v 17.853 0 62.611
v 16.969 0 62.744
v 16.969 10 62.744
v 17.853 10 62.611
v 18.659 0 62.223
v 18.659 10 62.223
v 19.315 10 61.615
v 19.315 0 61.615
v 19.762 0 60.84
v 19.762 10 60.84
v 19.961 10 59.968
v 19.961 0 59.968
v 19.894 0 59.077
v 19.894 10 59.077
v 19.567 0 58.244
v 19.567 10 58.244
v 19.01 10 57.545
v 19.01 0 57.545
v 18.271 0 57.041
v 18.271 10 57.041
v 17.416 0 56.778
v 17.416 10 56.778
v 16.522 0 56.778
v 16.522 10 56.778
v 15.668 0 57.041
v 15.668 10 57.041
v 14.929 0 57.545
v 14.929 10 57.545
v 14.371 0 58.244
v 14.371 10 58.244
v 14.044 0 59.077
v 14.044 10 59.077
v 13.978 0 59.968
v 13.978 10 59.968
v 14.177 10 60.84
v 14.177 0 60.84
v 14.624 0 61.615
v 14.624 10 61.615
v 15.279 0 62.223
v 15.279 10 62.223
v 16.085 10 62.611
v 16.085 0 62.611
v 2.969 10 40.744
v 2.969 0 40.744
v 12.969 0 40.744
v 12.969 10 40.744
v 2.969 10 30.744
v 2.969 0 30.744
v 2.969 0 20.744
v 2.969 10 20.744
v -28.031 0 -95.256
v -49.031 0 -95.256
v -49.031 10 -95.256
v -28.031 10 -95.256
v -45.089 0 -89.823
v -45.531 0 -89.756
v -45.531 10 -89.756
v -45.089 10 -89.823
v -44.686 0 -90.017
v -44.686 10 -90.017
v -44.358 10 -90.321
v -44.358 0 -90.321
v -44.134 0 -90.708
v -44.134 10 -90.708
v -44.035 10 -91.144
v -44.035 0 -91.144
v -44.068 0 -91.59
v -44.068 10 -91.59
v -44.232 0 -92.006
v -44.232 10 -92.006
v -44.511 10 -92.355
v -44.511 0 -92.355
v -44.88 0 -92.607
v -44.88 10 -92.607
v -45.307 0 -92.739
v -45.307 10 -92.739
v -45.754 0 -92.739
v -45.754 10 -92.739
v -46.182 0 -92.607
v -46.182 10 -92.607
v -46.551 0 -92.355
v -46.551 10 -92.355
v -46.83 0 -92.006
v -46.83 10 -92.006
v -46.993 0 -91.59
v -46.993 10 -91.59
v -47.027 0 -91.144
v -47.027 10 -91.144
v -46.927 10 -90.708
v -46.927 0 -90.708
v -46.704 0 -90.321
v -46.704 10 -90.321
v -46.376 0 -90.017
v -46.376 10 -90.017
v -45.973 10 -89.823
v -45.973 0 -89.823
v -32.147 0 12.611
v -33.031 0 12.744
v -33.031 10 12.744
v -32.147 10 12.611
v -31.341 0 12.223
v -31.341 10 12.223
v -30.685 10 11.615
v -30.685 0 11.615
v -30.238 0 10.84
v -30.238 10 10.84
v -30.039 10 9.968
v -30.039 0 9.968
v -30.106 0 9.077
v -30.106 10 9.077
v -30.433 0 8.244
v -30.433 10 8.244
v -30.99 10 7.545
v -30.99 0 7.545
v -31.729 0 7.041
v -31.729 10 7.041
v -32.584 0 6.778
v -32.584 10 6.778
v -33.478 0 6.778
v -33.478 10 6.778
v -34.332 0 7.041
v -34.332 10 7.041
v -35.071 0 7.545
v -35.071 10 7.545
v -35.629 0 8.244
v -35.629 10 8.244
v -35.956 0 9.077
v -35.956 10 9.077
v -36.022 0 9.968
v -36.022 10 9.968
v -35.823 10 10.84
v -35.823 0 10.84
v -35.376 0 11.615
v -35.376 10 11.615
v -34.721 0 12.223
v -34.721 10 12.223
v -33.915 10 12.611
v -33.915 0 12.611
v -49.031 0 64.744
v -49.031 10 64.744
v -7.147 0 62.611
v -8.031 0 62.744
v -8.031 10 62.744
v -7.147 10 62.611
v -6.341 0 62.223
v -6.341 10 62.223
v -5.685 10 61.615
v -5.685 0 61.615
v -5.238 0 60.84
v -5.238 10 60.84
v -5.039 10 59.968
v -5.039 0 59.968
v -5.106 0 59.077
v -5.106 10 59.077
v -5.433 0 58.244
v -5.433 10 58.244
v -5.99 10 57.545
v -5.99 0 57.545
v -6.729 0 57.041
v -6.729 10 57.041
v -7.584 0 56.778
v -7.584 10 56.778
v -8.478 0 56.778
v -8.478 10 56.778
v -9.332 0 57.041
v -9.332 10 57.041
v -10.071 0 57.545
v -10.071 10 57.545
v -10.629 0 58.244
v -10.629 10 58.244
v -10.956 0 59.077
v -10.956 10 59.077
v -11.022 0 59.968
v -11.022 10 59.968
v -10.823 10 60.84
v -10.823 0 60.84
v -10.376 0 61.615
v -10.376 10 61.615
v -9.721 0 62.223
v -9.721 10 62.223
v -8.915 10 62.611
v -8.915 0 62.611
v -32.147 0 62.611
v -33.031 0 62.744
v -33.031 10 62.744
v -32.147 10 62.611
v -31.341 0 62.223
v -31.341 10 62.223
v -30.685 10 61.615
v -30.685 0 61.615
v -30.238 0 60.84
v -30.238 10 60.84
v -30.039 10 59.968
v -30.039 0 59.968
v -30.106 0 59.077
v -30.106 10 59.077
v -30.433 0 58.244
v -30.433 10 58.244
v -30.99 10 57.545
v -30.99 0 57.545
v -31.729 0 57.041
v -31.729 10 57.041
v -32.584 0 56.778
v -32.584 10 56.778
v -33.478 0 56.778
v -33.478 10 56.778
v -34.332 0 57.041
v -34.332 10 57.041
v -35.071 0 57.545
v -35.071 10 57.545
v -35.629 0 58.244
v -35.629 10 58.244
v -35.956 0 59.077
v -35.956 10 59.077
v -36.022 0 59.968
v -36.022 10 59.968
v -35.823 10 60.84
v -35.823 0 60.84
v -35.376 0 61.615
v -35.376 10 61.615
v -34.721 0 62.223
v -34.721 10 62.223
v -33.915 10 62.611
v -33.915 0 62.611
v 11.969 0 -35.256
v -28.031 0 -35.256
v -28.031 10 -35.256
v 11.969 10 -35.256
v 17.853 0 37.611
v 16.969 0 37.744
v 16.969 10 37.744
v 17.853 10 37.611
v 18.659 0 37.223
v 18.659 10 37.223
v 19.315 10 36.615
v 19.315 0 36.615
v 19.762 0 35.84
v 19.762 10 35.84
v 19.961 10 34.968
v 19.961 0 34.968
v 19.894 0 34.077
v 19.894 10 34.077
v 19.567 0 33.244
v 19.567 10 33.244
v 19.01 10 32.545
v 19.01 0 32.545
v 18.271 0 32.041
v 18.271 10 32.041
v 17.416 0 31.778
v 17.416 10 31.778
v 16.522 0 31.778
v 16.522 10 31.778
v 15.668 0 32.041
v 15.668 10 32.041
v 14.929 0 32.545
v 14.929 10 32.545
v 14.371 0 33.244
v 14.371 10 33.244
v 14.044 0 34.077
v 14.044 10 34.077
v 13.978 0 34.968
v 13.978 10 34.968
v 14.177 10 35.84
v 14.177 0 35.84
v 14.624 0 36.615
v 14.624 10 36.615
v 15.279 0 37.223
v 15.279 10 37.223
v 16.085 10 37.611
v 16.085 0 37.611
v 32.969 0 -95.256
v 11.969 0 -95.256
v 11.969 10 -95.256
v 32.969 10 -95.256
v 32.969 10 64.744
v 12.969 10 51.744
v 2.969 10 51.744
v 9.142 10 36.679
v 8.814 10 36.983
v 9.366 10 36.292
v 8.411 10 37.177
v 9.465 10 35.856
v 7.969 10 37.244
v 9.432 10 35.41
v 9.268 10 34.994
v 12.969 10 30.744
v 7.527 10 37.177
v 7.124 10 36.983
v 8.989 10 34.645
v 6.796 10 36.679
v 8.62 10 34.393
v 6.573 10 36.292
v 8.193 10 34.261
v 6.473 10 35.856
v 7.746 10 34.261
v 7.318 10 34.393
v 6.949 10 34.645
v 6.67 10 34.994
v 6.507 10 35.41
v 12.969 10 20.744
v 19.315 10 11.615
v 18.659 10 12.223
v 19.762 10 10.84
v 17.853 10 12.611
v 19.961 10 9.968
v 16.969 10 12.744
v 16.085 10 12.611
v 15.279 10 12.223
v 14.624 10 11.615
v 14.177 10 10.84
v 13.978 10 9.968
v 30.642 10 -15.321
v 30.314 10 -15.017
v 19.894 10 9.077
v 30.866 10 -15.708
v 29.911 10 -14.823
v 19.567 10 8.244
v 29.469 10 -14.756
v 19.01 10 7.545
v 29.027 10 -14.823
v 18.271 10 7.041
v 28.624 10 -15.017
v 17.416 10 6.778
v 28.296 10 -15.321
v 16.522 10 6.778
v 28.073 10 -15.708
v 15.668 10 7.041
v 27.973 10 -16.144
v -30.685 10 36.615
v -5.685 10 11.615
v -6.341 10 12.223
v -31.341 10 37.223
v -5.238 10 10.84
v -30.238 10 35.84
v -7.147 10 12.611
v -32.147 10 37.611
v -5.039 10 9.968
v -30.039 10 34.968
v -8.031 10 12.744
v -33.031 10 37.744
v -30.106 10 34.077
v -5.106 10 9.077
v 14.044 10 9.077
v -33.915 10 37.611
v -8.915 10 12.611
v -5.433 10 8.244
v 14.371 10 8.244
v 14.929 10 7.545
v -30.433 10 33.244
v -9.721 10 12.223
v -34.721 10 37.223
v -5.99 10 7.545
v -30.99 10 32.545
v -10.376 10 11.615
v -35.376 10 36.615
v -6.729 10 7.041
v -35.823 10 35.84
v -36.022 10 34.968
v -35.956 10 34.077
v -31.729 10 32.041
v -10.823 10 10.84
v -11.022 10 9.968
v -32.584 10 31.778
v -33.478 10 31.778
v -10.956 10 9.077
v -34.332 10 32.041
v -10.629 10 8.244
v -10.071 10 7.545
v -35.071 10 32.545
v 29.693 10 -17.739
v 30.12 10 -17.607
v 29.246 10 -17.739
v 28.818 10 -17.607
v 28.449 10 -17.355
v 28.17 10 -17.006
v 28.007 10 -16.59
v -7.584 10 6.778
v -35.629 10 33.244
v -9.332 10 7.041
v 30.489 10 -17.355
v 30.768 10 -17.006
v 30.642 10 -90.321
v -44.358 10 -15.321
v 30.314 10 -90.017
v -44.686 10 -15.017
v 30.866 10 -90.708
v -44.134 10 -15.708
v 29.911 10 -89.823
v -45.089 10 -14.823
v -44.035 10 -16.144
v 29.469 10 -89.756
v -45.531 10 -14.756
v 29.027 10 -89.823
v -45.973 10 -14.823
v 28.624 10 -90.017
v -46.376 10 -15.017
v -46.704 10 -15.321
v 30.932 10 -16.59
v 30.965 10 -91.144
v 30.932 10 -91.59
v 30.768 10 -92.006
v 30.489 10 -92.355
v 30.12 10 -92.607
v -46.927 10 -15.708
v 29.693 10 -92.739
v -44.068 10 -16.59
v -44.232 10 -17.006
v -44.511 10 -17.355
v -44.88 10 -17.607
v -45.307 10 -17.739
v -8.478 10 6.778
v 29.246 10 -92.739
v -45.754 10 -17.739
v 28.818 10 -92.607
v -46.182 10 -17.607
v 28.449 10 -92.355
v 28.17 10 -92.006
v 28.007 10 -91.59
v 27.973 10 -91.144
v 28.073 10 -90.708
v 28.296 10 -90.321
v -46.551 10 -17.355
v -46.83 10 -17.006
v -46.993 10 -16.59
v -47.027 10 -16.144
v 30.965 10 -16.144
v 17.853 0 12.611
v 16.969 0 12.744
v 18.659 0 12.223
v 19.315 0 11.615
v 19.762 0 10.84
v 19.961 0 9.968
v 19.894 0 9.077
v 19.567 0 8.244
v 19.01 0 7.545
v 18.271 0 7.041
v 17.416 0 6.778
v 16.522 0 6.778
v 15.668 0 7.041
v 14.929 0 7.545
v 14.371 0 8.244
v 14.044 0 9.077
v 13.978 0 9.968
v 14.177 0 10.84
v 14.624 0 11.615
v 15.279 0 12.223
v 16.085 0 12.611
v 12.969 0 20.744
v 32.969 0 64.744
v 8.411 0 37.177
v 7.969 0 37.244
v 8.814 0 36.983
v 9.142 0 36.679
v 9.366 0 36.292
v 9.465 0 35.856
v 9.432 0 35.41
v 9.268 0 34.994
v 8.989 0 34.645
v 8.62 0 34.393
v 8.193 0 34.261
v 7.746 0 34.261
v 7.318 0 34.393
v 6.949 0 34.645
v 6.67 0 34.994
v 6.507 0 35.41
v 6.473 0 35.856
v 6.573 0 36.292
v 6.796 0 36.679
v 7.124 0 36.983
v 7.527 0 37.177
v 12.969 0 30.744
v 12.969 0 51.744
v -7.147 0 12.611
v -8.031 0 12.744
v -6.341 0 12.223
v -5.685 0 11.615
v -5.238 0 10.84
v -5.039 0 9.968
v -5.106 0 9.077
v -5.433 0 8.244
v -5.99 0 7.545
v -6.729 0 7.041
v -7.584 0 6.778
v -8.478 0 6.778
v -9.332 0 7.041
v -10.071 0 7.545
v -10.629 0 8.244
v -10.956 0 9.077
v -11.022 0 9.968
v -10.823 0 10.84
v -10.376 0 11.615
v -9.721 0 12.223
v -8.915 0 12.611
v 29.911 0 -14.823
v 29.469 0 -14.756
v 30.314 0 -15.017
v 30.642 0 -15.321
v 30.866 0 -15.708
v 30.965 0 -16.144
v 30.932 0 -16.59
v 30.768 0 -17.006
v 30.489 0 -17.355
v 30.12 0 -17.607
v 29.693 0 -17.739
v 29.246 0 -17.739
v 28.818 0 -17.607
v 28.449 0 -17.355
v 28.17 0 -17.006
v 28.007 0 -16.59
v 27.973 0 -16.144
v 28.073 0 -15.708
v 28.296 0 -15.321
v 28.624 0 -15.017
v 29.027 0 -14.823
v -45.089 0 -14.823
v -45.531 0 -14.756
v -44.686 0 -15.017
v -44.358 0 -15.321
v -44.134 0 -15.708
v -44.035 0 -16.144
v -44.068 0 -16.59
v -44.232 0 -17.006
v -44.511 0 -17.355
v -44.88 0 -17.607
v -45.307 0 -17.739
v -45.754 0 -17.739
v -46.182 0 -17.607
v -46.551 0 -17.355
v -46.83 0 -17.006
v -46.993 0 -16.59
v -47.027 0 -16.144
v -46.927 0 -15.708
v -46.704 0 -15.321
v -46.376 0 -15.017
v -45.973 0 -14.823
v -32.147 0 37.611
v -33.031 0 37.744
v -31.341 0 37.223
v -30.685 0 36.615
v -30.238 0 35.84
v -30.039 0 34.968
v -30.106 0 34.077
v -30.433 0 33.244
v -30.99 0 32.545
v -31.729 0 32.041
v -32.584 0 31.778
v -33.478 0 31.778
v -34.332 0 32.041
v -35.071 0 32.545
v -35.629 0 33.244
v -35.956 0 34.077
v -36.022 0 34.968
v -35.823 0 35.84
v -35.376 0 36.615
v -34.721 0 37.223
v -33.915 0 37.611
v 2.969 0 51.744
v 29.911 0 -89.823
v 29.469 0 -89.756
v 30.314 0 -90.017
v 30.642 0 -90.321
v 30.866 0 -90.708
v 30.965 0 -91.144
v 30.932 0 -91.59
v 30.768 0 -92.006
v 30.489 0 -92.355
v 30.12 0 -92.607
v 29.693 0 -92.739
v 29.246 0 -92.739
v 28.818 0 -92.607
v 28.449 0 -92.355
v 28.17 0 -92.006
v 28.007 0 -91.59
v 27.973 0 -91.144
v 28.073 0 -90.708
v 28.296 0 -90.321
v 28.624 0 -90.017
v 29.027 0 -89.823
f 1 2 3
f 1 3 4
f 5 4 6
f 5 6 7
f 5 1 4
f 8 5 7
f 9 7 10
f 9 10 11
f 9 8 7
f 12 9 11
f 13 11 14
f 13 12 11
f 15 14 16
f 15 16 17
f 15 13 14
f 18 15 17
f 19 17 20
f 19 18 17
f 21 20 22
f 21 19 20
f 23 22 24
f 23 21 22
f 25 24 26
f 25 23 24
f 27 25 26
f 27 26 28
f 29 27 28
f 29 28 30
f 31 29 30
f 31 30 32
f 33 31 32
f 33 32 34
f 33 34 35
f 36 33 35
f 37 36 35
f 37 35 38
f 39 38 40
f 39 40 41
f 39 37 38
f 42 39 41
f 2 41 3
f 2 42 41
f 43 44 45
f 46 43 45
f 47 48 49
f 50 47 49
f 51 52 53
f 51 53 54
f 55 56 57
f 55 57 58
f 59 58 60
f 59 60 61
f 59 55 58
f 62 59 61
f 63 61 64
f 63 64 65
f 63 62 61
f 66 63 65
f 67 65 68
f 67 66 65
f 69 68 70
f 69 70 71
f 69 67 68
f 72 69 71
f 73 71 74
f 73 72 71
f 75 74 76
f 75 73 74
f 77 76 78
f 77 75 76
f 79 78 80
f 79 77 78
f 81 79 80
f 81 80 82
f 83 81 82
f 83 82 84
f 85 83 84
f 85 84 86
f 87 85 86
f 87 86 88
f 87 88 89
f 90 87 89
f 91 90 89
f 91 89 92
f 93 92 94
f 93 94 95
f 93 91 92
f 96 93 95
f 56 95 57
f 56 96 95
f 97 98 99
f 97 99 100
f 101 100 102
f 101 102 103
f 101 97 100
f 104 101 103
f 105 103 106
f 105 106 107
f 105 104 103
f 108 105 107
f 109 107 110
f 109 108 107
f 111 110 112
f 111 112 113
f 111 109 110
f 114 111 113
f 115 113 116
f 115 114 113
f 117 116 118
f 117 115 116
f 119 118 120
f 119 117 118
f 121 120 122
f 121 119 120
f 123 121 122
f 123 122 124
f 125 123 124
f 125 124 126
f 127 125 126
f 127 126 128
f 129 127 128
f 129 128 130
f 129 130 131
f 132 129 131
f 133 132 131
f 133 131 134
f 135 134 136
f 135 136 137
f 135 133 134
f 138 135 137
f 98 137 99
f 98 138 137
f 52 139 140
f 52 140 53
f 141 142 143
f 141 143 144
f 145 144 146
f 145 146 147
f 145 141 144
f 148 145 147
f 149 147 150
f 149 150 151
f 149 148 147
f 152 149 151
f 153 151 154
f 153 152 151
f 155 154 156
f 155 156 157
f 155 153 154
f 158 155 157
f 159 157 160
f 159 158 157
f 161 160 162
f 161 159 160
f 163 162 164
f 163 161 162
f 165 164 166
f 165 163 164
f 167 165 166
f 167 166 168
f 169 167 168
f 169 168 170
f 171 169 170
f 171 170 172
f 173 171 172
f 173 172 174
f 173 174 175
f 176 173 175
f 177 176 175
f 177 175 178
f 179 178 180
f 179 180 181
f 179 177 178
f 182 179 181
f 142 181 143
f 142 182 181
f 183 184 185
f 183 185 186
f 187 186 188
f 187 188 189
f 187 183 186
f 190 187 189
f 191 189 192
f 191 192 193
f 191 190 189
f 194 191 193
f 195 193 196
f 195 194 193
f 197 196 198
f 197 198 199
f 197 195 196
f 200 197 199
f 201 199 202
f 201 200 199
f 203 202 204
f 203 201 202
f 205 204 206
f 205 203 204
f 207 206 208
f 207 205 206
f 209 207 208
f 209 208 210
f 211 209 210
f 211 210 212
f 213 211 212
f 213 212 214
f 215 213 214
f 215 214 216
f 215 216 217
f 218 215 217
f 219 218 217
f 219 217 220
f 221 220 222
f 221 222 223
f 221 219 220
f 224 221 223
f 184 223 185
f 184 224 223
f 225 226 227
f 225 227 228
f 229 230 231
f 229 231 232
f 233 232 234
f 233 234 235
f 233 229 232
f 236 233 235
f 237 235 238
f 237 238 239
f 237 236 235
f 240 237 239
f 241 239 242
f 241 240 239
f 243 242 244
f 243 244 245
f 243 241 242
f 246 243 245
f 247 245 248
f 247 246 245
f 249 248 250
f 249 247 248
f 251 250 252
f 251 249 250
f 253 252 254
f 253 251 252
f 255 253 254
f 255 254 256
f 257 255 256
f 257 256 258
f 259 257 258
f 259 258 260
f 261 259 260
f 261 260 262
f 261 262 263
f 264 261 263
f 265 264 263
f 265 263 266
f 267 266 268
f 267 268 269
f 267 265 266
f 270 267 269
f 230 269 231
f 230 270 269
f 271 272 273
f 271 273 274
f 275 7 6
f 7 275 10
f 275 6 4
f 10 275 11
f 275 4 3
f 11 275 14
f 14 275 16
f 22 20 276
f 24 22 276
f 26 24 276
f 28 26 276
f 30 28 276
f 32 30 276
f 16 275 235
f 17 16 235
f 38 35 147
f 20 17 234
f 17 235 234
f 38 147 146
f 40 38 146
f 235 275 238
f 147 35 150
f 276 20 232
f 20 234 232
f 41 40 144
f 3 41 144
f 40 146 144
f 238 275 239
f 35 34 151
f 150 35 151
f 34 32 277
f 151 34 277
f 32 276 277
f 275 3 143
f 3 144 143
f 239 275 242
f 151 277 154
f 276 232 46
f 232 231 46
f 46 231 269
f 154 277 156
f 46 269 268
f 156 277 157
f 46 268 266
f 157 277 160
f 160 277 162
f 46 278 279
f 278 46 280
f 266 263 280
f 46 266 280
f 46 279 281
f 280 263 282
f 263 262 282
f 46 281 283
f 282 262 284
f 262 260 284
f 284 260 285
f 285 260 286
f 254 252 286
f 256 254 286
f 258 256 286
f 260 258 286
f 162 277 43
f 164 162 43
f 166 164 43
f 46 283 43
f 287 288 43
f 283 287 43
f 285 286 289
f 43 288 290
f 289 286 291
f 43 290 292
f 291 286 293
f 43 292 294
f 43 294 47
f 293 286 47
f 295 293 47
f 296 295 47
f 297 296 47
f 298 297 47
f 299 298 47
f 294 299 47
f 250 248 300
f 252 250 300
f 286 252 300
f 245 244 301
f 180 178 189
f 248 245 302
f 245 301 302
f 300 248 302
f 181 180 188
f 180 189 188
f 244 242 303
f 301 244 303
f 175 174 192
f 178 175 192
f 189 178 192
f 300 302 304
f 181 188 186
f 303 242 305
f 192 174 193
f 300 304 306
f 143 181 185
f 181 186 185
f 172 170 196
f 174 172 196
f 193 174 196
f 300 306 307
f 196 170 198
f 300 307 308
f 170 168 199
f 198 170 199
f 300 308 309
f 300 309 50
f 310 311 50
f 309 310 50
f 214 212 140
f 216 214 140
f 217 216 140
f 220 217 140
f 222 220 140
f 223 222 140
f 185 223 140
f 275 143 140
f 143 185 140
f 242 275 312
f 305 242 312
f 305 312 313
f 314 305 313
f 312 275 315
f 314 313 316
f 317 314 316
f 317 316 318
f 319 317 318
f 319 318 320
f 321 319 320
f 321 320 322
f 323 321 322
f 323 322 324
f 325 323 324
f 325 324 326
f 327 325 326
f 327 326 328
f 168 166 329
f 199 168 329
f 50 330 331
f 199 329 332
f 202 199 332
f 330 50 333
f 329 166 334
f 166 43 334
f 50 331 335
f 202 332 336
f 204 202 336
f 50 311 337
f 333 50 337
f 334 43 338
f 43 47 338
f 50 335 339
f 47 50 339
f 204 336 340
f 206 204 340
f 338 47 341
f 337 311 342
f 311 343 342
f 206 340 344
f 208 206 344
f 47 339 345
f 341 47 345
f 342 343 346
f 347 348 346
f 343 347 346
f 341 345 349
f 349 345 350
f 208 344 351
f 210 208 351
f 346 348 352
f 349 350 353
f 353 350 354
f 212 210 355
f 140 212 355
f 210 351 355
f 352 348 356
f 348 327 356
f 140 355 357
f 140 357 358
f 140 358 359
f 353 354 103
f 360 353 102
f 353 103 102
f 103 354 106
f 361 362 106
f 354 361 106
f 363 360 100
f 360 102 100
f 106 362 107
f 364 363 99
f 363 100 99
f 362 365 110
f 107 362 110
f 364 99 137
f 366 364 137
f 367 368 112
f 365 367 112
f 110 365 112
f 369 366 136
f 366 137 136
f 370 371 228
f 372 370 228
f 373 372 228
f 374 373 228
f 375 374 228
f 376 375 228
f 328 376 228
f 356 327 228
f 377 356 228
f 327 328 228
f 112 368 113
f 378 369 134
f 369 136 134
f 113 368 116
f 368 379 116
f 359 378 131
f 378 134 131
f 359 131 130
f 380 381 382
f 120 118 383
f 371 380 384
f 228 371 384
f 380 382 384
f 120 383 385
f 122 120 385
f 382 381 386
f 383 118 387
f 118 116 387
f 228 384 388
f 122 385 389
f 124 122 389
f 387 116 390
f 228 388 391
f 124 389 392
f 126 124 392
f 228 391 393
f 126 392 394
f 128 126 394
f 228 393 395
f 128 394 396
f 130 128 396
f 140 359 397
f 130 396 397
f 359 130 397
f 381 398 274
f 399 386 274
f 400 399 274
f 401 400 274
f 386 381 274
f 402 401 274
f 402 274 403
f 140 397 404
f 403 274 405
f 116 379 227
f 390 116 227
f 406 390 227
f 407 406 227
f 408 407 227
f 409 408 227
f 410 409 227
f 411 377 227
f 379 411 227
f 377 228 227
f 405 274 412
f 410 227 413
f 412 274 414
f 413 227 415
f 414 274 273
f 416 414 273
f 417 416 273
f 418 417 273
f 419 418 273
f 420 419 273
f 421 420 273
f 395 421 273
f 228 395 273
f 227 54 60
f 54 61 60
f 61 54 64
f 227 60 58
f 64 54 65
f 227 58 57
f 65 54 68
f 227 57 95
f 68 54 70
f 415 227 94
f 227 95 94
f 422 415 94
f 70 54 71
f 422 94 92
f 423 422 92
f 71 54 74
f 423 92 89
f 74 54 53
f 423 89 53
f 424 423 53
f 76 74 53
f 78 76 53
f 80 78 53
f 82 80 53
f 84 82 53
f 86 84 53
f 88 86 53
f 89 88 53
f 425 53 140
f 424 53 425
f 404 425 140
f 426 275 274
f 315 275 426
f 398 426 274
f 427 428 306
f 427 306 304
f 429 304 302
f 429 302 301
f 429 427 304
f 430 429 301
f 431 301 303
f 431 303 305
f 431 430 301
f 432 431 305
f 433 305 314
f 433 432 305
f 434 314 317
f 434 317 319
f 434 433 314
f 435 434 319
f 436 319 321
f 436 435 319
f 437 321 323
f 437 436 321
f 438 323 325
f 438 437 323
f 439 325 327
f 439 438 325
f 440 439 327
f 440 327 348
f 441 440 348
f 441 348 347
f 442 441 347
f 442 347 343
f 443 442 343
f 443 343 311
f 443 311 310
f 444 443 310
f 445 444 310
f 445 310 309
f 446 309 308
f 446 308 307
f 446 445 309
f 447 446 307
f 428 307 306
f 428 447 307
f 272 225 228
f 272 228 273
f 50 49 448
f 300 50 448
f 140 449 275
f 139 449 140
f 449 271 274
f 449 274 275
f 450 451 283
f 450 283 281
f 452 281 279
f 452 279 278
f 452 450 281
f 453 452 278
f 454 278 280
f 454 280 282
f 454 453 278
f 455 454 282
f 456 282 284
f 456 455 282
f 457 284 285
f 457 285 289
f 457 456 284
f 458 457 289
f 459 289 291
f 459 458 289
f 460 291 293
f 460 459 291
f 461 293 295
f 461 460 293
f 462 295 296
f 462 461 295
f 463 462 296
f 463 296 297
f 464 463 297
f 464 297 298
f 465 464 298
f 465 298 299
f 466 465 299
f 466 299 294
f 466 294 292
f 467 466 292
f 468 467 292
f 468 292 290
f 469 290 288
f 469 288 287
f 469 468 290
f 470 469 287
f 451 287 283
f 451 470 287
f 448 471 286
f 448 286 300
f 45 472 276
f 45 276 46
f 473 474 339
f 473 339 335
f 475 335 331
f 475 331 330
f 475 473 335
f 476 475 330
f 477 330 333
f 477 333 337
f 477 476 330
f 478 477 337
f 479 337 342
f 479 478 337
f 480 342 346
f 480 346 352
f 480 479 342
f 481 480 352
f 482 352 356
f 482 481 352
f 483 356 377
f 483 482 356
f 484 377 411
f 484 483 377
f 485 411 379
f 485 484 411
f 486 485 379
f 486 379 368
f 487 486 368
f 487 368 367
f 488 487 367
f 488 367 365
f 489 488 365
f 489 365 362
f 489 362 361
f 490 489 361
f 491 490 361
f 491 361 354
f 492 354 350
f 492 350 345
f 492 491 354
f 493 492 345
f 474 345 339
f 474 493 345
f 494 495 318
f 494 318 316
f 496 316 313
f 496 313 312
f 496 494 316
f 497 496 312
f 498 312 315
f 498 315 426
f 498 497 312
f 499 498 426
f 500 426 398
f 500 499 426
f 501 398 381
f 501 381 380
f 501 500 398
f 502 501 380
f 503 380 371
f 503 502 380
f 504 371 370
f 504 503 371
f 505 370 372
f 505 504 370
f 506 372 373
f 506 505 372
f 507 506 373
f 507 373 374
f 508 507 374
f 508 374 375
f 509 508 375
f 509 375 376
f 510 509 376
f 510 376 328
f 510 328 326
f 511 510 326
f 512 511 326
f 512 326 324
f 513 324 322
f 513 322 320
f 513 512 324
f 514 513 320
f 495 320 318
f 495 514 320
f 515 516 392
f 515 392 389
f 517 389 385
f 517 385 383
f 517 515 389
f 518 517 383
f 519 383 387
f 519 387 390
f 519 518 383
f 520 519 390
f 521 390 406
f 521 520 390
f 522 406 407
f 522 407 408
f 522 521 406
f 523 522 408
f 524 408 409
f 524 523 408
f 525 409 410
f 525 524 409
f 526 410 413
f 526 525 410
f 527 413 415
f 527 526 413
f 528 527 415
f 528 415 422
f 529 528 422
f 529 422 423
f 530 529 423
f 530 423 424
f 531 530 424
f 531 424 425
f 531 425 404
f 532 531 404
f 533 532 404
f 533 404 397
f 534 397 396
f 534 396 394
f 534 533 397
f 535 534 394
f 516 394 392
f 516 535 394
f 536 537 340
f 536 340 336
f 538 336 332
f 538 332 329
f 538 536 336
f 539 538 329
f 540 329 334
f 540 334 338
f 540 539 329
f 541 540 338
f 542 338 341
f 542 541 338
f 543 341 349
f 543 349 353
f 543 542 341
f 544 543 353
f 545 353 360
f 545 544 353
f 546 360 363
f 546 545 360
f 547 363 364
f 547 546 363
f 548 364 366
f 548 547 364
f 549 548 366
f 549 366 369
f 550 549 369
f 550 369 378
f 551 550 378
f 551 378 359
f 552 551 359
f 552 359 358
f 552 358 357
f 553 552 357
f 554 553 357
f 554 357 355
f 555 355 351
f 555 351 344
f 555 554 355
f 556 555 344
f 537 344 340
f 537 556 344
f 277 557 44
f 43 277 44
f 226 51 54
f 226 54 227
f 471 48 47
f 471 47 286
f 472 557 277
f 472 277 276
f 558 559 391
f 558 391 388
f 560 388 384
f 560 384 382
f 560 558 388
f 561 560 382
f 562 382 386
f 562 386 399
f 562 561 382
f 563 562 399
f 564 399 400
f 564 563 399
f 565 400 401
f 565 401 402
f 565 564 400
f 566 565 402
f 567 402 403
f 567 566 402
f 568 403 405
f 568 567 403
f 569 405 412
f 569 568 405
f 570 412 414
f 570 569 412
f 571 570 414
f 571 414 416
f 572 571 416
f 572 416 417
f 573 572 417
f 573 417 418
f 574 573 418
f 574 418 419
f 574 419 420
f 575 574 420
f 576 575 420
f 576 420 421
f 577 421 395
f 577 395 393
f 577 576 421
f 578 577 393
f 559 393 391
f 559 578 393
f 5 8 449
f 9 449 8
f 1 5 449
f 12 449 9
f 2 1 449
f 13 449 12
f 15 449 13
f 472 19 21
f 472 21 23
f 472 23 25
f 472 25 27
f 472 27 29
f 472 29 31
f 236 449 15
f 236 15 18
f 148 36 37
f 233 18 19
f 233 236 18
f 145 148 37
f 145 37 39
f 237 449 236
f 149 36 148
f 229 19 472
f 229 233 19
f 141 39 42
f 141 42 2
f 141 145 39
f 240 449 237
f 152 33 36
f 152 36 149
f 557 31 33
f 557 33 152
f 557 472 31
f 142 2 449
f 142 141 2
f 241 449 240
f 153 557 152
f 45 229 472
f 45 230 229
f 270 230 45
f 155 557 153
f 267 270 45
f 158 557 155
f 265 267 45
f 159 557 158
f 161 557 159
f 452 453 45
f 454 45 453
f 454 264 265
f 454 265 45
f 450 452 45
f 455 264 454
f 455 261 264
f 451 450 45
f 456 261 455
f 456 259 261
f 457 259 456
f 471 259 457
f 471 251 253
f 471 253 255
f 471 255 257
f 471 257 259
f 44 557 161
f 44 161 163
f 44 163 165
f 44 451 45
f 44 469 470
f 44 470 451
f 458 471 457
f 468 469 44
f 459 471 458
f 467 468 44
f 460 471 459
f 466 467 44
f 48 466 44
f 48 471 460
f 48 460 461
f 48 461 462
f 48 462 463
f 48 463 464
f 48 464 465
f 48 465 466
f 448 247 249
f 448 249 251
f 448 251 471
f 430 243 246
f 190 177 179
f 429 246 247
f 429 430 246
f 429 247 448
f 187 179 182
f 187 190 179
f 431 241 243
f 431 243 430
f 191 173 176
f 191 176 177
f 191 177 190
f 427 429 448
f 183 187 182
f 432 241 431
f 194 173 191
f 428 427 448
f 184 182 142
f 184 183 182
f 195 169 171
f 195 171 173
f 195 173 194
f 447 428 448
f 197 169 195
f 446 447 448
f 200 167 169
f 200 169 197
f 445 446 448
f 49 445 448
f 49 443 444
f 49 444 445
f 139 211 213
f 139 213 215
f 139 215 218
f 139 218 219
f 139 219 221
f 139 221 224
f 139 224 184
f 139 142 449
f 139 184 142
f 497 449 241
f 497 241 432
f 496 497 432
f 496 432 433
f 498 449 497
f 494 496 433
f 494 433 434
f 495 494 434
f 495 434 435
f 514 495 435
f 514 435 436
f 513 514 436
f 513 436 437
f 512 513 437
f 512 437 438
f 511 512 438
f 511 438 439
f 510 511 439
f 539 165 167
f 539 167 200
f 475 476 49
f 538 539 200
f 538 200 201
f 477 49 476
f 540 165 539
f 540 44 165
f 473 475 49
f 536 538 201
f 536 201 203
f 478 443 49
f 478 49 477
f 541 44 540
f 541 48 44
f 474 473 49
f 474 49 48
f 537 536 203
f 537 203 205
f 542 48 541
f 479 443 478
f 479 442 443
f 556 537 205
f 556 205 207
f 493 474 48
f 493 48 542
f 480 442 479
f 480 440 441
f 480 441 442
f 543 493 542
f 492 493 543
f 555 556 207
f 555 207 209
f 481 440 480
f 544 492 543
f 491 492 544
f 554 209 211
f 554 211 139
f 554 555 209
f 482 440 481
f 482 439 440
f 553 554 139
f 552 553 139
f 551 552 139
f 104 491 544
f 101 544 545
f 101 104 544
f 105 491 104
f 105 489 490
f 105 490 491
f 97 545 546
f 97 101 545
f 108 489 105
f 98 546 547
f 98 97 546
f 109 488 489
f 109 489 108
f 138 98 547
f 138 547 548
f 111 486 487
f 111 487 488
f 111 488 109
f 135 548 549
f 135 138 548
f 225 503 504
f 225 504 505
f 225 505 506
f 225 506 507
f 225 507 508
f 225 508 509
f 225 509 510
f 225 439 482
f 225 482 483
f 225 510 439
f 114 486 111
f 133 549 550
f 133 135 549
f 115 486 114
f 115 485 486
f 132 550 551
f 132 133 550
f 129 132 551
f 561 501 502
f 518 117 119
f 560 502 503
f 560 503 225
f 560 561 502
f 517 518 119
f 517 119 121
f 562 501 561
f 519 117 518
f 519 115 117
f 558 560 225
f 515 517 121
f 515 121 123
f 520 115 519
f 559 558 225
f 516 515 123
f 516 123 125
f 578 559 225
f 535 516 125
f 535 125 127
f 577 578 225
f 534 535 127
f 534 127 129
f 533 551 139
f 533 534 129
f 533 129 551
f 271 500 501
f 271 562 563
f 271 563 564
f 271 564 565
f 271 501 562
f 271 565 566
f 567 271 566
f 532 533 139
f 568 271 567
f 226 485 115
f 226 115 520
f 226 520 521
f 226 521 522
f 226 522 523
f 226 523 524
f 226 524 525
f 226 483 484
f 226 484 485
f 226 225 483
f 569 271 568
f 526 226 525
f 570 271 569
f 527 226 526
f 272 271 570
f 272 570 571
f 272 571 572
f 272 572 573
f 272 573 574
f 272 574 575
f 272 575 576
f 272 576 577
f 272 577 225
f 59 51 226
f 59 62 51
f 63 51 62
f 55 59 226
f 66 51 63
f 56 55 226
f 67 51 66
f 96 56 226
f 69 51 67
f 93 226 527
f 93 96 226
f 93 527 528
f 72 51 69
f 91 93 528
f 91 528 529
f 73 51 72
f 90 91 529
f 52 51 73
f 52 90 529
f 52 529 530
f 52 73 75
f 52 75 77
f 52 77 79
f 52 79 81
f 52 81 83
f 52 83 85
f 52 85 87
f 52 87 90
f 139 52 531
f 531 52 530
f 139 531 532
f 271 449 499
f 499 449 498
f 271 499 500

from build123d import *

# Parameters (mm, degrees)
SKETCH1_R           = 3
SKETCH1_R_2         = 1.5
SKETCH1_W           = 10
SKETCH1_H           = 11
SKETCH1_H_2         = 10
BOSS_EXTRUDE1_DEPTH = 10


with BuildPart() as part:
    # Sketch1 → Boss-Extrude1 (new body)
    with BuildSketch(Plane(origin=(0, 0, 0), x_dir=(1, 0, 0), z_dir=(0, 1, 0))):
        Polygon((32.969203123, -64.744115369), (-49.030796877, -64.744115369), (-49.030796877, 95.255884631), (-28.030796877, 95.255884631), (-28.030796877, 35.255884631), (11.969203123, 35.255884631), (11.969203123, 95.255884631), (32.969203123, 95.255884631), align=None)
        with Locations(Location((-33.030796877, -59.744115369, 0), (0, 0, 270))):
            Circle(SKETCH1_R, mode=Mode.SUBTRACT)
        with Locations(Location((16.969203123, -59.744115369, 0), (0, 0, 270))):
            Circle(SKETCH1_R, mode=Mode.SUBTRACT)
        with Locations(Location((16.969203123, -9.744115369, 0), (0, 0, 270))):
            Circle(SKETCH1_R, mode=Mode.SUBTRACT)
        with Locations(Location((-33.030796877, -9.744115369, 0), (0, 0, 270))):
            Circle(SKETCH1_R, mode=Mode.SUBTRACT)
        with Locations(Location((-45.530796877, 91.255884631, 0), (0, 0, 270))):
            Circle(SKETCH1_R_2, mode=Mode.SUBTRACT)
        with Locations(Location((29.469203123, 91.255884631, 0), (0, 0, 270))):
            Circle(SKETCH1_R_2, mode=Mode.SUBTRACT)
        with Locations(Location((29.469203123, 16.255884631, 0), (0, 0, 270))):
            Circle(SKETCH1_R_2, mode=Mode.SUBTRACT)
        with Locations(Location((-45.530796877, 16.255884631, 0), (0, 0, 270))):
            Circle(SKETCH1_R_2, mode=Mode.SUBTRACT)
        with Locations(Location((-8.030796877, -9.744115369, 0), (0, 0, 270))):
            Circle(SKETCH1_R, mode=Mode.SUBTRACT)
        with Locations(Location((-33.030796877, -34.744115369, 0), (0, 0, 270))):
            Circle(SKETCH1_R, mode=Mode.SUBTRACT)
        with Locations(Location((16.969203123, -34.744115369, 0), (0, 0, 270))):
            Circle(SKETCH1_R, mode=Mode.SUBTRACT)
        with Locations(Location((-8.030796877, -59.744115369, 0), (0, 0, 270))):
            Circle(SKETCH1_R, mode=Mode.SUBTRACT)
        with Locations(Location((7.969203123, -35.744115369, 0), (0, 0, 270))):
            Circle(SKETCH1_R_2, mode=Mode.SUBTRACT)
        with Locations((7.969203123, -46.244115369)):
            Rectangle(SKETCH1_W, SKETCH1_H, mode=Mode.SUBTRACT)
        with Locations((7.969203123, -25.744115369)):
            Rectangle(SKETCH1_W, SKETCH1_H_2, mode=Mode.SUBTRACT)
    extrude(amount=BOSS_EXTRUDE1_DEPTH)


solid = part.part
